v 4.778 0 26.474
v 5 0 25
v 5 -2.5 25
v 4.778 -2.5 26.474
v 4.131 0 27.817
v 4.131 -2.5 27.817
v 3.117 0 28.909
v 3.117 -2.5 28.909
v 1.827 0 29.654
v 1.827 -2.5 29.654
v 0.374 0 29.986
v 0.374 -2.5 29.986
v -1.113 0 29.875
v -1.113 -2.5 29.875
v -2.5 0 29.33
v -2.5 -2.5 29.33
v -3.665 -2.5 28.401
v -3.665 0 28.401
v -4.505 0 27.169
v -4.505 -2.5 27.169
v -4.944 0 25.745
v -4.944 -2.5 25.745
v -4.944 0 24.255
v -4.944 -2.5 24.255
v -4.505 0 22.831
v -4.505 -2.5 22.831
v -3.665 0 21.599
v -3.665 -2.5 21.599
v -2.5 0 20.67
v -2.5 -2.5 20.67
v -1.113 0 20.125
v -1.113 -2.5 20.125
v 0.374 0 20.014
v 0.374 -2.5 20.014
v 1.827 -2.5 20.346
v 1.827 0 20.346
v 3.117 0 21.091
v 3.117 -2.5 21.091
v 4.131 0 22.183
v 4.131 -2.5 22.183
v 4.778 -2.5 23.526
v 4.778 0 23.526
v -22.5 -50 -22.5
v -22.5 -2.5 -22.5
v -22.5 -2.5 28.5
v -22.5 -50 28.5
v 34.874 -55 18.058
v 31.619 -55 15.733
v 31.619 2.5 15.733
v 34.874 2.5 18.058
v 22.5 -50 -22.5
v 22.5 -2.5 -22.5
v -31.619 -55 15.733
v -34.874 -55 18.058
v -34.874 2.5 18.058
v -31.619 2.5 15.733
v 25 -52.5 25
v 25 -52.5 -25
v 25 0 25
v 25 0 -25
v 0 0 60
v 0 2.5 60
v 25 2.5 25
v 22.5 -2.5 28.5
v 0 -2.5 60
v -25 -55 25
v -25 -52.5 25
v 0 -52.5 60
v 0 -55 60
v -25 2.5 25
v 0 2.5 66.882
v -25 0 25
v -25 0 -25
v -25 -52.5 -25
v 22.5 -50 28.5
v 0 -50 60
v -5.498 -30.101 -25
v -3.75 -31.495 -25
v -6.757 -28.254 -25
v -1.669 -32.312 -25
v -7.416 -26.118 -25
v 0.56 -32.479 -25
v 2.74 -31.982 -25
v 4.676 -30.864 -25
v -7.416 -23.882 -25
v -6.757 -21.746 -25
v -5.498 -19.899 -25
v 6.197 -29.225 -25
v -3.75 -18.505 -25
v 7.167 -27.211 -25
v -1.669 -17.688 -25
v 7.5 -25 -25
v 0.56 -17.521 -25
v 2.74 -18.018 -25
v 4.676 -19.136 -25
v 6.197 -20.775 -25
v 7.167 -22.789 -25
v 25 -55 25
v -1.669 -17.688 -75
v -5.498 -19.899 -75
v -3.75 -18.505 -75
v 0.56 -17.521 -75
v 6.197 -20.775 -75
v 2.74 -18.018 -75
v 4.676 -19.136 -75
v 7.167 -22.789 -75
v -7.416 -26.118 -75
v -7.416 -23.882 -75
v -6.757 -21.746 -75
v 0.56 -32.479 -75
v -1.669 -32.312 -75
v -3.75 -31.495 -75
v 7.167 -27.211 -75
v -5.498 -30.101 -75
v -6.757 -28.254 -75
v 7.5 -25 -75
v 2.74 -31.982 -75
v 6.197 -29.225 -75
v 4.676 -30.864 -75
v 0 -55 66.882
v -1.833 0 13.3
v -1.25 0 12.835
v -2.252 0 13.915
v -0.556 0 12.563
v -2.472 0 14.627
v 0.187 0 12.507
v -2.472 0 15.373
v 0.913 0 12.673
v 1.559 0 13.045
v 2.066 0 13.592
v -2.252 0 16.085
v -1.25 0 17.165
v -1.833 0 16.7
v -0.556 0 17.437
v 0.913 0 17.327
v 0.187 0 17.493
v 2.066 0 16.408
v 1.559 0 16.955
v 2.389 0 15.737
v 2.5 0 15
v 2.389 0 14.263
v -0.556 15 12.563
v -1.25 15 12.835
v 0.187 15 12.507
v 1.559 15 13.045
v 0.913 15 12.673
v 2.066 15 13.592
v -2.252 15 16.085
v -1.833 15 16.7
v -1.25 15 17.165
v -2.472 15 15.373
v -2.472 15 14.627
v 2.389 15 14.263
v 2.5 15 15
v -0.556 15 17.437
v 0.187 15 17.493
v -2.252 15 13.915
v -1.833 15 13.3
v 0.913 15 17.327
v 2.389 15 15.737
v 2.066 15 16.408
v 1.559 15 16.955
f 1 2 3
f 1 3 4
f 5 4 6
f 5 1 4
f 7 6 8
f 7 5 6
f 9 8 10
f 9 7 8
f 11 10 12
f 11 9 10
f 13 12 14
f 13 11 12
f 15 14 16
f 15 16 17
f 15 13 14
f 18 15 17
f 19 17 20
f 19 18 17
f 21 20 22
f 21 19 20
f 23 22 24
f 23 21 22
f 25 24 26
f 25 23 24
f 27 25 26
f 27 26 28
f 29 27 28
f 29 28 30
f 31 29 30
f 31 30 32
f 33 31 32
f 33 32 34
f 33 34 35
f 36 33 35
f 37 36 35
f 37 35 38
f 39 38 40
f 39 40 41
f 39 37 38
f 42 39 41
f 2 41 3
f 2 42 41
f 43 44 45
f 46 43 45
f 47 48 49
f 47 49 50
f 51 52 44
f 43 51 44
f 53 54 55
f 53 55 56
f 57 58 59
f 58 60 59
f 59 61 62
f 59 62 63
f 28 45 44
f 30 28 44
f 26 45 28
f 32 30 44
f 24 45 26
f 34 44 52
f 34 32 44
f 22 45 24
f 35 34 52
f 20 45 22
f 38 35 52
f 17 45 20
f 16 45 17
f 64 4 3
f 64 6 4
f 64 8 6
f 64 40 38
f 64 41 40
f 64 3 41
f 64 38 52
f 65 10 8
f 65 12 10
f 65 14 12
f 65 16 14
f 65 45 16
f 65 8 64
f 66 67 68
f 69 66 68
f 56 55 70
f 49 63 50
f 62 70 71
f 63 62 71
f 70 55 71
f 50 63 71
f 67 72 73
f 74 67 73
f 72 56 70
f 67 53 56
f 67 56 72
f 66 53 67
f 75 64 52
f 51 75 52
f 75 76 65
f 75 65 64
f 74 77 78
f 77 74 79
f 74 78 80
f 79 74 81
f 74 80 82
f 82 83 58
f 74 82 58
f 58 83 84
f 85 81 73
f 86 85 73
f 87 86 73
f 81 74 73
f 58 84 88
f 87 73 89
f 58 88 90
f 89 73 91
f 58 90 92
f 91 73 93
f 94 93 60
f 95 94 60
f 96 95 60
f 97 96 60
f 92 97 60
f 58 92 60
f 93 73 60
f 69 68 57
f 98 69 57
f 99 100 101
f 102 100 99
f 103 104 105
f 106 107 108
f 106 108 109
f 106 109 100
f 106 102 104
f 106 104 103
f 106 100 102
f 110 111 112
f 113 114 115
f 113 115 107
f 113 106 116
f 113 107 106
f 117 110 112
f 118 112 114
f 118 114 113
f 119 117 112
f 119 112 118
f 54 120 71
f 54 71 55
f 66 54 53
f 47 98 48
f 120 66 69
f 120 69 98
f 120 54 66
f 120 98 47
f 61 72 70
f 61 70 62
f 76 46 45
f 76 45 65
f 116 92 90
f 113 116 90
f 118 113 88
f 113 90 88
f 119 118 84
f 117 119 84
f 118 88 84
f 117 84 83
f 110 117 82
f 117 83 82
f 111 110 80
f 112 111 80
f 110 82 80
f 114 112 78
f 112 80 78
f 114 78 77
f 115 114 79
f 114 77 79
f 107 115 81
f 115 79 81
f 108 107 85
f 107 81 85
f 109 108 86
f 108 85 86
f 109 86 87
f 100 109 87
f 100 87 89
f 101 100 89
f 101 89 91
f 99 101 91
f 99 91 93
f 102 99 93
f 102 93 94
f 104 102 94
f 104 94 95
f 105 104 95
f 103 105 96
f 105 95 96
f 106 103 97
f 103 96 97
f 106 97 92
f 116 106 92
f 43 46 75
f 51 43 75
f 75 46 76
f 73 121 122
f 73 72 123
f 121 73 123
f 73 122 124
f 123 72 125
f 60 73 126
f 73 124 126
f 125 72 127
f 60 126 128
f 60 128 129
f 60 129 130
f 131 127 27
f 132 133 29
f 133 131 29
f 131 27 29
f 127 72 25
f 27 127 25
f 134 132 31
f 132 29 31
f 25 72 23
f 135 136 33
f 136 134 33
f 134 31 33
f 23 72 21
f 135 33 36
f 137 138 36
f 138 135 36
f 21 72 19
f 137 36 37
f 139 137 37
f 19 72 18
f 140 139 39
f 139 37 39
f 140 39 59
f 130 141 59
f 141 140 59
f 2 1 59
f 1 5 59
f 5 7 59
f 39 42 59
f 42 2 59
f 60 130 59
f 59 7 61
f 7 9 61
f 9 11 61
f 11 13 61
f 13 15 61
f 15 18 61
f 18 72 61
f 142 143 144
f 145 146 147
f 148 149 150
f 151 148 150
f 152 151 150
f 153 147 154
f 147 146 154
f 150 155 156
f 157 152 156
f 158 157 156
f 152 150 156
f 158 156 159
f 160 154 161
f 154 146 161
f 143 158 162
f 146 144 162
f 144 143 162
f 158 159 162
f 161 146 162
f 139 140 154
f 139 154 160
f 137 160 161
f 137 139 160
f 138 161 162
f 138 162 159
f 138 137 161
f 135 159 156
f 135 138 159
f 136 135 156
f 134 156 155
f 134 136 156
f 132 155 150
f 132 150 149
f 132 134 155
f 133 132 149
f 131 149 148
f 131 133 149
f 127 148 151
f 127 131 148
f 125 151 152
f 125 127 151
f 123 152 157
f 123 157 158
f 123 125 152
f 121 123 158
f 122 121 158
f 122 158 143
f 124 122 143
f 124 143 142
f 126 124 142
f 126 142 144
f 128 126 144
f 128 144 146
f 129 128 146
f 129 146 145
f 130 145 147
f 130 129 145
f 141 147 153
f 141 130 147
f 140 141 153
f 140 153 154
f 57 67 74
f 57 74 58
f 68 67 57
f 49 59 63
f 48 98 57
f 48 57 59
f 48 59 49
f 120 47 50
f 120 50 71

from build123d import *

# Parameters (mm, degrees)
F0_R     = 2.5
F0_R_2   = 5
F1_DEPTH = 2.5
F2_DEPTH = 50
F4_DEPTH = 2.5
F5_DEPTH = 55
F6_DEPTH = 2.5
F7_DEPTH = 15
F8_R     = 7.5
F9_DEPTH = 50


with BuildPart() as f1:
    # F0 (on Front) → F1 (new body)
    with BuildSketch(Plane.XZ):
        Polygon((22.5, 25), (22.5, 28.5), (0, 60), (-22.5, 28.5), (-22.5, 25), (-22.5, -22.5), (22.5, -22.5), align=None)
        with Locations((0, 15)):
            Circle(F0_R, mode=Mode.SUBTRACT)
        with Locations((0, 25)):
            Circle(F0_R_2, mode=Mode.SUBTRACT)
        with Locations((0, 15)):
            Circle(F0_R)
    extrude(amount=F1_DEPTH)

    # F0 (on Front) → F2 (join)
    with BuildSketch(Plane.XZ):
        Polygon((-25, -25), (25, -25), (25, 25), (22.5, 28.5), (22.5, 25), (22.5, -22.5), (-22.5, -22.5), (-22.5, 25), (-22.5, 28.5), (-25, 25), align=None)
    extrude(amount=F2_DEPTH)

    # F3 (on face) → F4 (join)
    with BuildSketch(Plane.XZ.offset(50)):
        Polygon((22.5, 28.5), (22.5, 25), (22.5, -22.5), (-22.5, -22.5), (-22.5, 25), (-22.5, 28.5), (-25, 25), (-25, -25), (25, -25), (25, 25), align=None)
        Polygon((22.5, -22.5), (22.5, 25), (22.5, 28.5), (0, 60), (-22.5, 28.5), (-22.5, 25), (-22.5, -22.5), align=None)
    extrude(amount=F4_DEPTH)

    # F0 (on Front) → F5 (join)
    with BuildSketch(Plane.XZ):
        Polygon((22.5, 28.5), (25, 25), (31.619358, 15.732899), (34.874292, 18.057852), (0, 66.88186), (-34.874292, 18.057852), (-31.619358, 15.732899), (-25, 25), (-22.5, 28.5), (0, 60), align=None)
    extrude(amount=F5_DEPTH)

    # F0 (on Front) → F6 (join)
    with BuildSketch(Plane.XZ):
        Polygon((22.5, 28.5), (25, 25), (31.619358, 15.732899), (34.874292, 18.057852), (0, 66.88186), (-34.874292, 18.057852), (-31.619358, 15.732899), (-25, 25), (-22.5, 28.5), (0, 60), align=None)
    extrude(amount=-F6_DEPTH)

    # F0 (on Front) → F7 (join)
    with BuildSketch(Plane.XZ):
        with Locations((0, 15)):
            Circle(F0_R)
    extrude(amount=-F7_DEPTH)

    # F8 (on face) → F9 (join)
    with BuildSketch(Plane(origin=(0, 0, -25), x_dir=(1, 0, 0), z_dir=(0, 0, -1))):
        with Locations((0, 25)):
            Circle(F8_R)
    extrude(amount=F9_DEPTH)


solid = f1.part
